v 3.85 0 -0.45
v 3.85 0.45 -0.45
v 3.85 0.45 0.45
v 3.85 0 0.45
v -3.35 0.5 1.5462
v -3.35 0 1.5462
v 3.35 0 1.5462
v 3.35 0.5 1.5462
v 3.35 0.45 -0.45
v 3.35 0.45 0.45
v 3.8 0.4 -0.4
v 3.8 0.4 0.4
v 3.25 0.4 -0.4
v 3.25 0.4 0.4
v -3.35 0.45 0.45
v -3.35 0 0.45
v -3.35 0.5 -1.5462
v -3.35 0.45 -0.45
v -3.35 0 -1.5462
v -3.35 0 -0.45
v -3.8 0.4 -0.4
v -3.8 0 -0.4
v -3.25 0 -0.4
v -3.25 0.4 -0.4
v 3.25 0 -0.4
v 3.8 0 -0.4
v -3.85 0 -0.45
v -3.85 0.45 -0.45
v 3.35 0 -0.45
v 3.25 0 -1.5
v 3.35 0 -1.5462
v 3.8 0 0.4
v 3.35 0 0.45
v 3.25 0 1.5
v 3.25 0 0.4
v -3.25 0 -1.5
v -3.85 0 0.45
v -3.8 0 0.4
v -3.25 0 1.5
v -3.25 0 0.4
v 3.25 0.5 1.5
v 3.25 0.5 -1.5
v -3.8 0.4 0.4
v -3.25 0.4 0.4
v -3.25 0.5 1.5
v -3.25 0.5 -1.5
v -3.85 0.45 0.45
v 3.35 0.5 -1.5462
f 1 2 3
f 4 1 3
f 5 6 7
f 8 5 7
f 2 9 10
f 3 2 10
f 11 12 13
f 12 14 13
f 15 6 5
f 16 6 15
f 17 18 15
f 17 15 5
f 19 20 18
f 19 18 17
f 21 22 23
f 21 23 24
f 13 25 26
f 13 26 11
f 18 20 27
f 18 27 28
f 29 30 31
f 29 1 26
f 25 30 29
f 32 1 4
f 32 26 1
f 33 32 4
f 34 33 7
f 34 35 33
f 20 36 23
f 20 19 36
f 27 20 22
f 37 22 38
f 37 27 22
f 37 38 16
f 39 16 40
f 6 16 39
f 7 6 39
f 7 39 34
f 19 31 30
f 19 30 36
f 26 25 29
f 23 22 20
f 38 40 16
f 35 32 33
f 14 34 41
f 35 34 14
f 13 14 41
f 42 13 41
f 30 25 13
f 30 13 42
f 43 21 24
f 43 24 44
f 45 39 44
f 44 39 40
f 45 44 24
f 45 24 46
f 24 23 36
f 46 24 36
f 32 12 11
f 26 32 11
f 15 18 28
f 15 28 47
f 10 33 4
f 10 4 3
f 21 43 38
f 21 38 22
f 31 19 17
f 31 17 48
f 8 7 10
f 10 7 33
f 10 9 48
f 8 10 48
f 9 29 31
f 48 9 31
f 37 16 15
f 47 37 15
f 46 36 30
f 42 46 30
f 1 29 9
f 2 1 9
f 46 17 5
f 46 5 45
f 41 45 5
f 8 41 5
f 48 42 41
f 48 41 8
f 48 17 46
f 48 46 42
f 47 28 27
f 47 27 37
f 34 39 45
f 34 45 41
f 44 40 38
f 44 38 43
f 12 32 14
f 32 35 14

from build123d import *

# Parameters (mm, degrees)
SKETCH_1_W               = 6.7
SKETCH_1_H               = 3.092307692
SKETCH_1_W_2             = 6.5
SKETCH_1_H_2             = 3
EXTRUDE_1_DEPTH          = 0.5
SKETCH_3_W               = 0.8
SKETCH_3_H               = 0.4
CUT_EXTRUDE_1_DEPTH      = 1
CUT_EXTRUDE_1_DEPTH_BACK = 7.7
SKETCH_8_W               = 0.9
SKETCH_8_H               = 0.45
EXTRUDE_4_DEPTH          = 0.5
SKETCH_9_W               = 0.8
SKETCH_9_H               = 0.4
CUT_EXTRUDE_2_DEPTH      = 0.45


with BuildPart() as part:
    # 草圖1 → 填料-伸長1 (new body)
    with BuildSketch(Plane(origin=(0, 0, 0), x_dir=(1, 0, 0), z_dir=(0, 1, 0))):
        Rectangle(SKETCH_1_W, SKETCH_1_H)
        Rectangle(SKETCH_1_W_2, SKETCH_1_H_2, mode=Mode.SUBTRACT)
    extrude(amount=EXTRUDE_1_DEPTH)

    # 草圖3 → 除料-伸長1 (cut, two sides)
    with BuildSketch(Plane.ZY.offset(3.35)) as cut_extrude_1_sk:
        with Locations((0, 0.2)):
            Rectangle(SKETCH_3_W, SKETCH_3_H)
    extrude(amount=CUT_EXTRUDE_1_DEPTH, mode=Mode.SUBTRACT)
    extrude(cut_extrude_1_sk.sketch, amount=-CUT_EXTRUDE_1_DEPTH_BACK, mode=Mode.SUBTRACT)

    # 草圖8 → 填料-伸長4 (add)
    with BuildSketch(Plane.ZY.offset(3.35)):
        with Locations((0, 0.225)):
            Rectangle(SKETCH_8_W, SKETCH_8_H)
    extrude_4 = extrude(amount=EXTRUDE_4_DEPTH)

    # 草圖9 → 除料-伸長2 (cut)
    with BuildSketch(Plane(origin=(-3.35, 0, 0), x_dir=(0, 0, -1), z_dir=(1, 0, 0))):
        with Locations((0, 0.2)):
            Rectangle(SKETCH_9_W, SKETCH_9_H)
    cut_extrude_2 = extrude(amount=-CUT_EXTRUDE_2_DEPTH, mode=Mode.SUBTRACT)

    # 鏡射7: 填料-伸長4, 除料-伸長2 across plane
    add(extrude_4.mirror(Plane(origin=(0, 0, 0), x_dir=(0, 0, 1), z_dir=(1, 0, 0))))
    add(cut_extrude_2.mirror(Plane(origin=(0, 0, 0), x_dir=(0, 0, 1), z_dir=(1, 0, 0))), mode=Mode.SUBTRACT)


solid = part.part
